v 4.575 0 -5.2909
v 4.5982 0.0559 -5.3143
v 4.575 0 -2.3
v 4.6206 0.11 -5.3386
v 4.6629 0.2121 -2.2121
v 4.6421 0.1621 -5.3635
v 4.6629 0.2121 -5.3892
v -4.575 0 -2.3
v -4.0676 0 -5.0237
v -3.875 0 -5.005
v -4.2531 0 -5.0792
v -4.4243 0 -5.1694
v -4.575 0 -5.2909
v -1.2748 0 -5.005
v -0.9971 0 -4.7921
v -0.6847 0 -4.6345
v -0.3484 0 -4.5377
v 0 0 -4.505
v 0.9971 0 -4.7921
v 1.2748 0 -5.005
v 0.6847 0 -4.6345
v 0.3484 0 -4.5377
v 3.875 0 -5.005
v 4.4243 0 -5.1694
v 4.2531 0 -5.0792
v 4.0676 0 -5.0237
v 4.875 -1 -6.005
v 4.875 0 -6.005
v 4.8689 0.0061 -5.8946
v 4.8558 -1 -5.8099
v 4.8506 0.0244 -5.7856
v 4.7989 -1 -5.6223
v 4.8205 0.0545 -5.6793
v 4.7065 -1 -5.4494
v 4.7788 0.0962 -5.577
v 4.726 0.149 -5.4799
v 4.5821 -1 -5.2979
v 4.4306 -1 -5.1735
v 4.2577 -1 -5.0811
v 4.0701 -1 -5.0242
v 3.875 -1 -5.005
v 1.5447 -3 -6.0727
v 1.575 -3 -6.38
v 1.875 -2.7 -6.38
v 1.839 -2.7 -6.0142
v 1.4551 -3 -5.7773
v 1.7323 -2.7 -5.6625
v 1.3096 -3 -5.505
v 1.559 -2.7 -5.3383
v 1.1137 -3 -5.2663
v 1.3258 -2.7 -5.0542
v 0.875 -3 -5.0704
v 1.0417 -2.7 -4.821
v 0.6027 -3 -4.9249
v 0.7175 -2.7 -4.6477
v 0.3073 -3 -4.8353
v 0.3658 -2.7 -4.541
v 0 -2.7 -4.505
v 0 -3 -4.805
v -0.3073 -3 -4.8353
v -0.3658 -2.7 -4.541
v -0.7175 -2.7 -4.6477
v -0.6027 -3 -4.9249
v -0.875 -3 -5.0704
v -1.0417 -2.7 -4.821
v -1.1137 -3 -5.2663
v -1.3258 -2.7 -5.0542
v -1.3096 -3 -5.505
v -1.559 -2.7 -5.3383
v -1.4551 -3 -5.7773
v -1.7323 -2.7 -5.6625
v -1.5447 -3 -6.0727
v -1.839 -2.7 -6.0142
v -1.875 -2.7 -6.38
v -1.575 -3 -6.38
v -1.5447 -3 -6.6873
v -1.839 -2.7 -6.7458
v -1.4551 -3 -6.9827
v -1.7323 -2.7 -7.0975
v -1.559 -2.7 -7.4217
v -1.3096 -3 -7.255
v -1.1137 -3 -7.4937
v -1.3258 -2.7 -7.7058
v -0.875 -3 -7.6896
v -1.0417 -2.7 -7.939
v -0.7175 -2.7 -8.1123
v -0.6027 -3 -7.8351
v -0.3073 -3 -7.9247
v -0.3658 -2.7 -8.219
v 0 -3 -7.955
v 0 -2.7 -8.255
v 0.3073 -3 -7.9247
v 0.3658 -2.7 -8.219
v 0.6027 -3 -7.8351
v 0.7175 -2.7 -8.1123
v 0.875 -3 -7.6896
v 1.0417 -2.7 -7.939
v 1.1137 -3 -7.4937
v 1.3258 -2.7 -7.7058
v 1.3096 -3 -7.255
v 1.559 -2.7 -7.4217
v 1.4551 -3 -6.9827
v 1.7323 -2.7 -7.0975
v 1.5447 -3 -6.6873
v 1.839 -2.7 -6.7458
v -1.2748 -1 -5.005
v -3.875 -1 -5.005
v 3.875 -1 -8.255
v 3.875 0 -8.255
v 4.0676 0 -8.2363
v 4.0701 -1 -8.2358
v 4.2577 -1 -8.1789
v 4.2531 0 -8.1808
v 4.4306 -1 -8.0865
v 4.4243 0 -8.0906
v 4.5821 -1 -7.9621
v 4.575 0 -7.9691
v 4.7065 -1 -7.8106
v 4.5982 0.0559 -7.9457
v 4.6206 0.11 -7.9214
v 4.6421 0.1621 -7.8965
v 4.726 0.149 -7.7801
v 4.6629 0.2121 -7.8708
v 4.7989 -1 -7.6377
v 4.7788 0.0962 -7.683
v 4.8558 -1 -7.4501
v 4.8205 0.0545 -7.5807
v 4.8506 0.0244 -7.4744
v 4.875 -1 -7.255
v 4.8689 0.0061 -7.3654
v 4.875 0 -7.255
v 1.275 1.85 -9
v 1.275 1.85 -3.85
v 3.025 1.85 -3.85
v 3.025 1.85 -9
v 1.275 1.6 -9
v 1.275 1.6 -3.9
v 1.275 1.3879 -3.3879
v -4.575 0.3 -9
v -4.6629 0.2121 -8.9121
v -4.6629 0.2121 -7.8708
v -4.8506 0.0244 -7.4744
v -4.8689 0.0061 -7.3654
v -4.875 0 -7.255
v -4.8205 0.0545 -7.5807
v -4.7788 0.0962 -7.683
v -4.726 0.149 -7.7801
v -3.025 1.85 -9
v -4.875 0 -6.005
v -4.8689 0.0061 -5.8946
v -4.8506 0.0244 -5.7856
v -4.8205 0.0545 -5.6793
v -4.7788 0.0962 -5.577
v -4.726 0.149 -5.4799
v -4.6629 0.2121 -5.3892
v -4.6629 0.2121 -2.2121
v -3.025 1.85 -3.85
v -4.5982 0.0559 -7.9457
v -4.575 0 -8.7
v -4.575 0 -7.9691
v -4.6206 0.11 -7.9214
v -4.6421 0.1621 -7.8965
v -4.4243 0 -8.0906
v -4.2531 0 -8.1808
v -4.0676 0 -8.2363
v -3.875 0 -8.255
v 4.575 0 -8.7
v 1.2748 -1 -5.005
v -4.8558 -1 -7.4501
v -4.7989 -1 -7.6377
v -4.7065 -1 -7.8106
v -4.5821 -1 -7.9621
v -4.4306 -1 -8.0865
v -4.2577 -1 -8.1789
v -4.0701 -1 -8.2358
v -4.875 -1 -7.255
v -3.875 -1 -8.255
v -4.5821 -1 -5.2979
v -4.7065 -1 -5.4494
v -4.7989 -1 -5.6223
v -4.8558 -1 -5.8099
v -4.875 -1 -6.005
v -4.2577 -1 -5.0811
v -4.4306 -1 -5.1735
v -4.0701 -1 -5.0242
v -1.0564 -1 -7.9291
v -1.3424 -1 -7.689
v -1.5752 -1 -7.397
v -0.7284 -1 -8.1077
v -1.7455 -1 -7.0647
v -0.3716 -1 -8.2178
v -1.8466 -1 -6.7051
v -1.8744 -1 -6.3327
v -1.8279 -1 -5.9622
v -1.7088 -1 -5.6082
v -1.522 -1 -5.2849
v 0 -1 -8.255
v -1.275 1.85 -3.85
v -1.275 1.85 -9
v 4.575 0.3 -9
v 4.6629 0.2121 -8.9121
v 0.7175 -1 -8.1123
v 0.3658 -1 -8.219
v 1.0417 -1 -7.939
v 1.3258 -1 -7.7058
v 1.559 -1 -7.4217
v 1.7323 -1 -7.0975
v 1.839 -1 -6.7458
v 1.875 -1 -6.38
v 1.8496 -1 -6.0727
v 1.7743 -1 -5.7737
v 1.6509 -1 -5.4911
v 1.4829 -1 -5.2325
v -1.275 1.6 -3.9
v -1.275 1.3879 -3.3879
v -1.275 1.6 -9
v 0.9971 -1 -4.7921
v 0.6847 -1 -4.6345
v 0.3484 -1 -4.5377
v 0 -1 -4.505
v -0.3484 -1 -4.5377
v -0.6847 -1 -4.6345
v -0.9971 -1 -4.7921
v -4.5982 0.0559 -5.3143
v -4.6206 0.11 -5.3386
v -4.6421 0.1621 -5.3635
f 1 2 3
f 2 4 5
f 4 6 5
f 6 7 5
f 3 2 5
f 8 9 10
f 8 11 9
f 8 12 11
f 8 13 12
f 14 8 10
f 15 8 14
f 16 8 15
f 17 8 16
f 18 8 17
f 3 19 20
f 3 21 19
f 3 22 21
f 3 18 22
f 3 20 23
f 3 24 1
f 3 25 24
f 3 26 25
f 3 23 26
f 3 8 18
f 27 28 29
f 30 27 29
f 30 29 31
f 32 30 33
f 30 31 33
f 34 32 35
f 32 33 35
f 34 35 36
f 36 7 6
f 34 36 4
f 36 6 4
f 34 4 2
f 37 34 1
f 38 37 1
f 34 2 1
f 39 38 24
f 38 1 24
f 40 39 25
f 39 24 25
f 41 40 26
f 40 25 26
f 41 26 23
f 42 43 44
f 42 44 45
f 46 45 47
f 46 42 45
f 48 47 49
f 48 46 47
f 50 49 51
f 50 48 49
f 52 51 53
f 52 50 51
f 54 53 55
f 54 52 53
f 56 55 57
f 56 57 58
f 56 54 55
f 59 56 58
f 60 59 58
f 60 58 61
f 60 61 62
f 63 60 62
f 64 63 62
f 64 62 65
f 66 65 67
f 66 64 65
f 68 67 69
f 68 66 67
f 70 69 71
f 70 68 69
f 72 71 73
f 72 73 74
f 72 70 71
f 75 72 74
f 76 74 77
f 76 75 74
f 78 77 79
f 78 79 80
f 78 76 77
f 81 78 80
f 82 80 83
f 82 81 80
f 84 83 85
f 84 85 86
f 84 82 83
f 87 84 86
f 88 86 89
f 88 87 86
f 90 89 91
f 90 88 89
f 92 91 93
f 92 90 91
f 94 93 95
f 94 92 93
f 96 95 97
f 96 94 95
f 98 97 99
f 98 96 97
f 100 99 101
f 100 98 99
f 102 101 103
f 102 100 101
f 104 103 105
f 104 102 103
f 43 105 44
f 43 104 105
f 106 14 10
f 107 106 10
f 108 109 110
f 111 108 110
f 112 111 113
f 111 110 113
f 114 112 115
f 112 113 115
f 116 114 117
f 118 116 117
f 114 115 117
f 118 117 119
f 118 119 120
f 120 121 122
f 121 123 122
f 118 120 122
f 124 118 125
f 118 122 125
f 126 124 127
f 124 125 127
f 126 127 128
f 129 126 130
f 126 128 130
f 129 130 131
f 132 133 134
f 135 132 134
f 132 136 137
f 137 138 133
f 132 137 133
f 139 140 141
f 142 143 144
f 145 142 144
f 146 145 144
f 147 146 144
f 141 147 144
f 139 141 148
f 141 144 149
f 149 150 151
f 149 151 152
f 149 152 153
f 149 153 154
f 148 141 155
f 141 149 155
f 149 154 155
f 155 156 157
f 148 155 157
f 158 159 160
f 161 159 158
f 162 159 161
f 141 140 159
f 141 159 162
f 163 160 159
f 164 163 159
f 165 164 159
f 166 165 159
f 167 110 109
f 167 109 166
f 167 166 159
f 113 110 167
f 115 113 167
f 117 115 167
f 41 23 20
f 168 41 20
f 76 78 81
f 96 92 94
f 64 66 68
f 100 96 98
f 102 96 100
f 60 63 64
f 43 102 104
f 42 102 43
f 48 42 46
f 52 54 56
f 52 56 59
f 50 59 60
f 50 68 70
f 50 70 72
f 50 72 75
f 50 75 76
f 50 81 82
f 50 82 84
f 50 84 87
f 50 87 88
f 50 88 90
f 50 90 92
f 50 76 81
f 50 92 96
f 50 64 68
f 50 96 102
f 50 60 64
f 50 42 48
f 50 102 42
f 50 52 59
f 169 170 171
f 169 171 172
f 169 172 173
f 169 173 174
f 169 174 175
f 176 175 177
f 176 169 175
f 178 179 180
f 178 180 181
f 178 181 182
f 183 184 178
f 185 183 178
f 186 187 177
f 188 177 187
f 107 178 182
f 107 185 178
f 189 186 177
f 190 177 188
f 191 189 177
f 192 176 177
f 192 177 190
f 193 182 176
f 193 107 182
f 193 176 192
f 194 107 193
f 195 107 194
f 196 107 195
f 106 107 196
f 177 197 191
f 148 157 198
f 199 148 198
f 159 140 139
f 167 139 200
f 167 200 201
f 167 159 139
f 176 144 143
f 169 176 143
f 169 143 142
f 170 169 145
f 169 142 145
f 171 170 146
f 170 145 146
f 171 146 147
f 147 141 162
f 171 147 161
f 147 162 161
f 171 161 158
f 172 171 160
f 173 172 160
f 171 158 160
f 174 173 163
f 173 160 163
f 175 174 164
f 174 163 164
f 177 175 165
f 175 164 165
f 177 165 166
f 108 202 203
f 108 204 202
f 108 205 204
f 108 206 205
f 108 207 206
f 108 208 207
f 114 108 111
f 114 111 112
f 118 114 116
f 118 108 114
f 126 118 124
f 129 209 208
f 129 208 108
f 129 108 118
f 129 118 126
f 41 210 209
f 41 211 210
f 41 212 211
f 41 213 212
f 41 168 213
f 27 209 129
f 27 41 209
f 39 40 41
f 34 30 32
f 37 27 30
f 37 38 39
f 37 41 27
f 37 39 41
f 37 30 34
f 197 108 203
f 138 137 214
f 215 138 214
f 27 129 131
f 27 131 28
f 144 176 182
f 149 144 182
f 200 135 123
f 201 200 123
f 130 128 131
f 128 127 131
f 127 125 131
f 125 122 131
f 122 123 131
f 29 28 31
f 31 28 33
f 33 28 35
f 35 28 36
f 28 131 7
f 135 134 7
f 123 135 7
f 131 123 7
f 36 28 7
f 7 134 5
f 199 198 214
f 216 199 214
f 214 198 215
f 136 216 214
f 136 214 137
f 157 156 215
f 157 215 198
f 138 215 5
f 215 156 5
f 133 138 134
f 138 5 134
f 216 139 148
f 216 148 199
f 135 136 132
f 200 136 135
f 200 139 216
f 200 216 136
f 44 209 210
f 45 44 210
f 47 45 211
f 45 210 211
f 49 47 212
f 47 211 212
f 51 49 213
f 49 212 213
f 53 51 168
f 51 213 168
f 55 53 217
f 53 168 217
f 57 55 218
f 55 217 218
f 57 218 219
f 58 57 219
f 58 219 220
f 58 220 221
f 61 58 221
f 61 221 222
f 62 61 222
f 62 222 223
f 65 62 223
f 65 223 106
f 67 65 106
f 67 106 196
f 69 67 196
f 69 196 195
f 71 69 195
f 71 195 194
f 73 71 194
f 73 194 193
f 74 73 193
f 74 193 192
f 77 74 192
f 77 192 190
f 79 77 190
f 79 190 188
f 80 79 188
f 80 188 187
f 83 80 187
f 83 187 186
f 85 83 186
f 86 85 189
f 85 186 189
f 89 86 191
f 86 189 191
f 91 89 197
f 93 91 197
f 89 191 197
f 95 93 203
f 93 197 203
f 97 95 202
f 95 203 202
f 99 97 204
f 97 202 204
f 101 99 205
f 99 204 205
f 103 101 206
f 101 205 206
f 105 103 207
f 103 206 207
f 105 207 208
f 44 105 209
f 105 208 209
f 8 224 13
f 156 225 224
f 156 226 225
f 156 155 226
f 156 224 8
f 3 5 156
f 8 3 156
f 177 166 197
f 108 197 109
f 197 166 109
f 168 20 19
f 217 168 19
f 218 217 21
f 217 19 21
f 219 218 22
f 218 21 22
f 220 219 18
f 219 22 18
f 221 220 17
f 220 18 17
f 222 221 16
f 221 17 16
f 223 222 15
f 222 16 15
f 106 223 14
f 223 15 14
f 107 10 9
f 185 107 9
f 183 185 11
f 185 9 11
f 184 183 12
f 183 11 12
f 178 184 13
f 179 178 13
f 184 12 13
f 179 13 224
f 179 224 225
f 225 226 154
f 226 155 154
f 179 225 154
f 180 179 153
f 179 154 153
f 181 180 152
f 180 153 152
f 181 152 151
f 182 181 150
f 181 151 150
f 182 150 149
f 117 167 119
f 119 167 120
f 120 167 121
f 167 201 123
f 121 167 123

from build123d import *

# Parameters (mm, degrees)
PAD006_DEPTH         = 1
SKETCH010_W          = 9.75
SKETCH010_H          = 7
PAD007_DEPTH         = 1.85
SKETCH012_R          = 1.875
PAD005_DEPTH         = 2
POCKET_DEPTH         = 9.001
POCKET001_DEPTH      = 4.876
POCKET001_DEPTH_BACK = -4.876
CHAMFER_SIZE         = 0.3


with BuildPart() as part:
    # Sketch013 → Pad006 (new body)
    with BuildSketch(Plane.XZ):
        with BuildLine():
            ThreePointArc((1.274755, -5.005), (0, -4.505), (-1.274755, -5.005))
            Line((-1.274755, -5.005), (-3.875, -5.005))
            ThreePointArc((-3.875, -5.005), (-4.582107, -5.297893), (-4.875, -6.005))
            Line((-4.875, -6.005), (-4.875, -7.255))
            ThreePointArc((-4.875, -7.255), (-4.582107, -7.962107), (-3.875, -8.255))
            Line((-3.875, -8.255), (3.875, -8.255))
            ThreePointArc((3.875, -8.255), (4.582107, -7.962107), (4.875, -7.255))
            Line((4.875, -7.255), (4.875, -6.005))
            ThreePointArc((4.875, -6.005), (4.582107, -5.297893), (3.875, -5.005))
            Line((3.875, -5.005), (1.274755, -5.005))
        make_face()
    extrude(amount=PAD006_DEPTH)

    # Sketch010 → Pad007 (join)
    with BuildSketch(Plane.XZ):
        with Locations((0, -5.5)):
            Rectangle(SKETCH010_W, SKETCH010_H)
    extrude(amount=-PAD007_DEPTH)

    # Sketch012 → Pad005 (join)
    with BuildSketch(Plane.XZ.offset(1)):
        with Locations((0, -6.38)):
            Circle(SKETCH012_R)
    extrude(amount=PAD005_DEPTH)

    # Sketch → Pocket (cut, through all)
    with BuildSketch(Plane.XY):
        Polygon((-1.275, 3.6), (-1.275, 1.6), (1.275, 1.6), (1.275, 3.6), (4.875, 0), (4.875, 5), (-4.875, 5), (-4.875, 0), align=None)
    extrude(amount=-POCKET_DEPTH, mode=Mode.SUBTRACT)

    # Sketch014 → Pocket001 (cut, two sides)
    with BuildSketch(Plane.YZ) as pocket001_sk:
        Polygon((0, 0), (0, -2), (4, -6), (4, 0), align=None)
    extrude(amount=-POCKET001_DEPTH, mode=Mode.SUBTRACT)
    extrude(pocket001_sk.sketch, amount=-POCKET001_DEPTH_BACK, mode=Mode.SUBTRACT)

    # Chamfer
    chamfer_edges = [part.edges().sort_by_distance(p)[0] for p in [
        (-1.875, -3, -6.38),
        (0, 1.6, -3.6),
        (-4.875, 0, -4.0025),
        (-4.875, 0, -8.1275),
        (4.875, 0, -4.0025),
        (4.875, 0, -8.1275),
        (0, 0, -9),
        (0, 0, -2),
    ]]
    chamfer(chamfer_edges, length=CHAMFER_SIZE)


solid = part.part
